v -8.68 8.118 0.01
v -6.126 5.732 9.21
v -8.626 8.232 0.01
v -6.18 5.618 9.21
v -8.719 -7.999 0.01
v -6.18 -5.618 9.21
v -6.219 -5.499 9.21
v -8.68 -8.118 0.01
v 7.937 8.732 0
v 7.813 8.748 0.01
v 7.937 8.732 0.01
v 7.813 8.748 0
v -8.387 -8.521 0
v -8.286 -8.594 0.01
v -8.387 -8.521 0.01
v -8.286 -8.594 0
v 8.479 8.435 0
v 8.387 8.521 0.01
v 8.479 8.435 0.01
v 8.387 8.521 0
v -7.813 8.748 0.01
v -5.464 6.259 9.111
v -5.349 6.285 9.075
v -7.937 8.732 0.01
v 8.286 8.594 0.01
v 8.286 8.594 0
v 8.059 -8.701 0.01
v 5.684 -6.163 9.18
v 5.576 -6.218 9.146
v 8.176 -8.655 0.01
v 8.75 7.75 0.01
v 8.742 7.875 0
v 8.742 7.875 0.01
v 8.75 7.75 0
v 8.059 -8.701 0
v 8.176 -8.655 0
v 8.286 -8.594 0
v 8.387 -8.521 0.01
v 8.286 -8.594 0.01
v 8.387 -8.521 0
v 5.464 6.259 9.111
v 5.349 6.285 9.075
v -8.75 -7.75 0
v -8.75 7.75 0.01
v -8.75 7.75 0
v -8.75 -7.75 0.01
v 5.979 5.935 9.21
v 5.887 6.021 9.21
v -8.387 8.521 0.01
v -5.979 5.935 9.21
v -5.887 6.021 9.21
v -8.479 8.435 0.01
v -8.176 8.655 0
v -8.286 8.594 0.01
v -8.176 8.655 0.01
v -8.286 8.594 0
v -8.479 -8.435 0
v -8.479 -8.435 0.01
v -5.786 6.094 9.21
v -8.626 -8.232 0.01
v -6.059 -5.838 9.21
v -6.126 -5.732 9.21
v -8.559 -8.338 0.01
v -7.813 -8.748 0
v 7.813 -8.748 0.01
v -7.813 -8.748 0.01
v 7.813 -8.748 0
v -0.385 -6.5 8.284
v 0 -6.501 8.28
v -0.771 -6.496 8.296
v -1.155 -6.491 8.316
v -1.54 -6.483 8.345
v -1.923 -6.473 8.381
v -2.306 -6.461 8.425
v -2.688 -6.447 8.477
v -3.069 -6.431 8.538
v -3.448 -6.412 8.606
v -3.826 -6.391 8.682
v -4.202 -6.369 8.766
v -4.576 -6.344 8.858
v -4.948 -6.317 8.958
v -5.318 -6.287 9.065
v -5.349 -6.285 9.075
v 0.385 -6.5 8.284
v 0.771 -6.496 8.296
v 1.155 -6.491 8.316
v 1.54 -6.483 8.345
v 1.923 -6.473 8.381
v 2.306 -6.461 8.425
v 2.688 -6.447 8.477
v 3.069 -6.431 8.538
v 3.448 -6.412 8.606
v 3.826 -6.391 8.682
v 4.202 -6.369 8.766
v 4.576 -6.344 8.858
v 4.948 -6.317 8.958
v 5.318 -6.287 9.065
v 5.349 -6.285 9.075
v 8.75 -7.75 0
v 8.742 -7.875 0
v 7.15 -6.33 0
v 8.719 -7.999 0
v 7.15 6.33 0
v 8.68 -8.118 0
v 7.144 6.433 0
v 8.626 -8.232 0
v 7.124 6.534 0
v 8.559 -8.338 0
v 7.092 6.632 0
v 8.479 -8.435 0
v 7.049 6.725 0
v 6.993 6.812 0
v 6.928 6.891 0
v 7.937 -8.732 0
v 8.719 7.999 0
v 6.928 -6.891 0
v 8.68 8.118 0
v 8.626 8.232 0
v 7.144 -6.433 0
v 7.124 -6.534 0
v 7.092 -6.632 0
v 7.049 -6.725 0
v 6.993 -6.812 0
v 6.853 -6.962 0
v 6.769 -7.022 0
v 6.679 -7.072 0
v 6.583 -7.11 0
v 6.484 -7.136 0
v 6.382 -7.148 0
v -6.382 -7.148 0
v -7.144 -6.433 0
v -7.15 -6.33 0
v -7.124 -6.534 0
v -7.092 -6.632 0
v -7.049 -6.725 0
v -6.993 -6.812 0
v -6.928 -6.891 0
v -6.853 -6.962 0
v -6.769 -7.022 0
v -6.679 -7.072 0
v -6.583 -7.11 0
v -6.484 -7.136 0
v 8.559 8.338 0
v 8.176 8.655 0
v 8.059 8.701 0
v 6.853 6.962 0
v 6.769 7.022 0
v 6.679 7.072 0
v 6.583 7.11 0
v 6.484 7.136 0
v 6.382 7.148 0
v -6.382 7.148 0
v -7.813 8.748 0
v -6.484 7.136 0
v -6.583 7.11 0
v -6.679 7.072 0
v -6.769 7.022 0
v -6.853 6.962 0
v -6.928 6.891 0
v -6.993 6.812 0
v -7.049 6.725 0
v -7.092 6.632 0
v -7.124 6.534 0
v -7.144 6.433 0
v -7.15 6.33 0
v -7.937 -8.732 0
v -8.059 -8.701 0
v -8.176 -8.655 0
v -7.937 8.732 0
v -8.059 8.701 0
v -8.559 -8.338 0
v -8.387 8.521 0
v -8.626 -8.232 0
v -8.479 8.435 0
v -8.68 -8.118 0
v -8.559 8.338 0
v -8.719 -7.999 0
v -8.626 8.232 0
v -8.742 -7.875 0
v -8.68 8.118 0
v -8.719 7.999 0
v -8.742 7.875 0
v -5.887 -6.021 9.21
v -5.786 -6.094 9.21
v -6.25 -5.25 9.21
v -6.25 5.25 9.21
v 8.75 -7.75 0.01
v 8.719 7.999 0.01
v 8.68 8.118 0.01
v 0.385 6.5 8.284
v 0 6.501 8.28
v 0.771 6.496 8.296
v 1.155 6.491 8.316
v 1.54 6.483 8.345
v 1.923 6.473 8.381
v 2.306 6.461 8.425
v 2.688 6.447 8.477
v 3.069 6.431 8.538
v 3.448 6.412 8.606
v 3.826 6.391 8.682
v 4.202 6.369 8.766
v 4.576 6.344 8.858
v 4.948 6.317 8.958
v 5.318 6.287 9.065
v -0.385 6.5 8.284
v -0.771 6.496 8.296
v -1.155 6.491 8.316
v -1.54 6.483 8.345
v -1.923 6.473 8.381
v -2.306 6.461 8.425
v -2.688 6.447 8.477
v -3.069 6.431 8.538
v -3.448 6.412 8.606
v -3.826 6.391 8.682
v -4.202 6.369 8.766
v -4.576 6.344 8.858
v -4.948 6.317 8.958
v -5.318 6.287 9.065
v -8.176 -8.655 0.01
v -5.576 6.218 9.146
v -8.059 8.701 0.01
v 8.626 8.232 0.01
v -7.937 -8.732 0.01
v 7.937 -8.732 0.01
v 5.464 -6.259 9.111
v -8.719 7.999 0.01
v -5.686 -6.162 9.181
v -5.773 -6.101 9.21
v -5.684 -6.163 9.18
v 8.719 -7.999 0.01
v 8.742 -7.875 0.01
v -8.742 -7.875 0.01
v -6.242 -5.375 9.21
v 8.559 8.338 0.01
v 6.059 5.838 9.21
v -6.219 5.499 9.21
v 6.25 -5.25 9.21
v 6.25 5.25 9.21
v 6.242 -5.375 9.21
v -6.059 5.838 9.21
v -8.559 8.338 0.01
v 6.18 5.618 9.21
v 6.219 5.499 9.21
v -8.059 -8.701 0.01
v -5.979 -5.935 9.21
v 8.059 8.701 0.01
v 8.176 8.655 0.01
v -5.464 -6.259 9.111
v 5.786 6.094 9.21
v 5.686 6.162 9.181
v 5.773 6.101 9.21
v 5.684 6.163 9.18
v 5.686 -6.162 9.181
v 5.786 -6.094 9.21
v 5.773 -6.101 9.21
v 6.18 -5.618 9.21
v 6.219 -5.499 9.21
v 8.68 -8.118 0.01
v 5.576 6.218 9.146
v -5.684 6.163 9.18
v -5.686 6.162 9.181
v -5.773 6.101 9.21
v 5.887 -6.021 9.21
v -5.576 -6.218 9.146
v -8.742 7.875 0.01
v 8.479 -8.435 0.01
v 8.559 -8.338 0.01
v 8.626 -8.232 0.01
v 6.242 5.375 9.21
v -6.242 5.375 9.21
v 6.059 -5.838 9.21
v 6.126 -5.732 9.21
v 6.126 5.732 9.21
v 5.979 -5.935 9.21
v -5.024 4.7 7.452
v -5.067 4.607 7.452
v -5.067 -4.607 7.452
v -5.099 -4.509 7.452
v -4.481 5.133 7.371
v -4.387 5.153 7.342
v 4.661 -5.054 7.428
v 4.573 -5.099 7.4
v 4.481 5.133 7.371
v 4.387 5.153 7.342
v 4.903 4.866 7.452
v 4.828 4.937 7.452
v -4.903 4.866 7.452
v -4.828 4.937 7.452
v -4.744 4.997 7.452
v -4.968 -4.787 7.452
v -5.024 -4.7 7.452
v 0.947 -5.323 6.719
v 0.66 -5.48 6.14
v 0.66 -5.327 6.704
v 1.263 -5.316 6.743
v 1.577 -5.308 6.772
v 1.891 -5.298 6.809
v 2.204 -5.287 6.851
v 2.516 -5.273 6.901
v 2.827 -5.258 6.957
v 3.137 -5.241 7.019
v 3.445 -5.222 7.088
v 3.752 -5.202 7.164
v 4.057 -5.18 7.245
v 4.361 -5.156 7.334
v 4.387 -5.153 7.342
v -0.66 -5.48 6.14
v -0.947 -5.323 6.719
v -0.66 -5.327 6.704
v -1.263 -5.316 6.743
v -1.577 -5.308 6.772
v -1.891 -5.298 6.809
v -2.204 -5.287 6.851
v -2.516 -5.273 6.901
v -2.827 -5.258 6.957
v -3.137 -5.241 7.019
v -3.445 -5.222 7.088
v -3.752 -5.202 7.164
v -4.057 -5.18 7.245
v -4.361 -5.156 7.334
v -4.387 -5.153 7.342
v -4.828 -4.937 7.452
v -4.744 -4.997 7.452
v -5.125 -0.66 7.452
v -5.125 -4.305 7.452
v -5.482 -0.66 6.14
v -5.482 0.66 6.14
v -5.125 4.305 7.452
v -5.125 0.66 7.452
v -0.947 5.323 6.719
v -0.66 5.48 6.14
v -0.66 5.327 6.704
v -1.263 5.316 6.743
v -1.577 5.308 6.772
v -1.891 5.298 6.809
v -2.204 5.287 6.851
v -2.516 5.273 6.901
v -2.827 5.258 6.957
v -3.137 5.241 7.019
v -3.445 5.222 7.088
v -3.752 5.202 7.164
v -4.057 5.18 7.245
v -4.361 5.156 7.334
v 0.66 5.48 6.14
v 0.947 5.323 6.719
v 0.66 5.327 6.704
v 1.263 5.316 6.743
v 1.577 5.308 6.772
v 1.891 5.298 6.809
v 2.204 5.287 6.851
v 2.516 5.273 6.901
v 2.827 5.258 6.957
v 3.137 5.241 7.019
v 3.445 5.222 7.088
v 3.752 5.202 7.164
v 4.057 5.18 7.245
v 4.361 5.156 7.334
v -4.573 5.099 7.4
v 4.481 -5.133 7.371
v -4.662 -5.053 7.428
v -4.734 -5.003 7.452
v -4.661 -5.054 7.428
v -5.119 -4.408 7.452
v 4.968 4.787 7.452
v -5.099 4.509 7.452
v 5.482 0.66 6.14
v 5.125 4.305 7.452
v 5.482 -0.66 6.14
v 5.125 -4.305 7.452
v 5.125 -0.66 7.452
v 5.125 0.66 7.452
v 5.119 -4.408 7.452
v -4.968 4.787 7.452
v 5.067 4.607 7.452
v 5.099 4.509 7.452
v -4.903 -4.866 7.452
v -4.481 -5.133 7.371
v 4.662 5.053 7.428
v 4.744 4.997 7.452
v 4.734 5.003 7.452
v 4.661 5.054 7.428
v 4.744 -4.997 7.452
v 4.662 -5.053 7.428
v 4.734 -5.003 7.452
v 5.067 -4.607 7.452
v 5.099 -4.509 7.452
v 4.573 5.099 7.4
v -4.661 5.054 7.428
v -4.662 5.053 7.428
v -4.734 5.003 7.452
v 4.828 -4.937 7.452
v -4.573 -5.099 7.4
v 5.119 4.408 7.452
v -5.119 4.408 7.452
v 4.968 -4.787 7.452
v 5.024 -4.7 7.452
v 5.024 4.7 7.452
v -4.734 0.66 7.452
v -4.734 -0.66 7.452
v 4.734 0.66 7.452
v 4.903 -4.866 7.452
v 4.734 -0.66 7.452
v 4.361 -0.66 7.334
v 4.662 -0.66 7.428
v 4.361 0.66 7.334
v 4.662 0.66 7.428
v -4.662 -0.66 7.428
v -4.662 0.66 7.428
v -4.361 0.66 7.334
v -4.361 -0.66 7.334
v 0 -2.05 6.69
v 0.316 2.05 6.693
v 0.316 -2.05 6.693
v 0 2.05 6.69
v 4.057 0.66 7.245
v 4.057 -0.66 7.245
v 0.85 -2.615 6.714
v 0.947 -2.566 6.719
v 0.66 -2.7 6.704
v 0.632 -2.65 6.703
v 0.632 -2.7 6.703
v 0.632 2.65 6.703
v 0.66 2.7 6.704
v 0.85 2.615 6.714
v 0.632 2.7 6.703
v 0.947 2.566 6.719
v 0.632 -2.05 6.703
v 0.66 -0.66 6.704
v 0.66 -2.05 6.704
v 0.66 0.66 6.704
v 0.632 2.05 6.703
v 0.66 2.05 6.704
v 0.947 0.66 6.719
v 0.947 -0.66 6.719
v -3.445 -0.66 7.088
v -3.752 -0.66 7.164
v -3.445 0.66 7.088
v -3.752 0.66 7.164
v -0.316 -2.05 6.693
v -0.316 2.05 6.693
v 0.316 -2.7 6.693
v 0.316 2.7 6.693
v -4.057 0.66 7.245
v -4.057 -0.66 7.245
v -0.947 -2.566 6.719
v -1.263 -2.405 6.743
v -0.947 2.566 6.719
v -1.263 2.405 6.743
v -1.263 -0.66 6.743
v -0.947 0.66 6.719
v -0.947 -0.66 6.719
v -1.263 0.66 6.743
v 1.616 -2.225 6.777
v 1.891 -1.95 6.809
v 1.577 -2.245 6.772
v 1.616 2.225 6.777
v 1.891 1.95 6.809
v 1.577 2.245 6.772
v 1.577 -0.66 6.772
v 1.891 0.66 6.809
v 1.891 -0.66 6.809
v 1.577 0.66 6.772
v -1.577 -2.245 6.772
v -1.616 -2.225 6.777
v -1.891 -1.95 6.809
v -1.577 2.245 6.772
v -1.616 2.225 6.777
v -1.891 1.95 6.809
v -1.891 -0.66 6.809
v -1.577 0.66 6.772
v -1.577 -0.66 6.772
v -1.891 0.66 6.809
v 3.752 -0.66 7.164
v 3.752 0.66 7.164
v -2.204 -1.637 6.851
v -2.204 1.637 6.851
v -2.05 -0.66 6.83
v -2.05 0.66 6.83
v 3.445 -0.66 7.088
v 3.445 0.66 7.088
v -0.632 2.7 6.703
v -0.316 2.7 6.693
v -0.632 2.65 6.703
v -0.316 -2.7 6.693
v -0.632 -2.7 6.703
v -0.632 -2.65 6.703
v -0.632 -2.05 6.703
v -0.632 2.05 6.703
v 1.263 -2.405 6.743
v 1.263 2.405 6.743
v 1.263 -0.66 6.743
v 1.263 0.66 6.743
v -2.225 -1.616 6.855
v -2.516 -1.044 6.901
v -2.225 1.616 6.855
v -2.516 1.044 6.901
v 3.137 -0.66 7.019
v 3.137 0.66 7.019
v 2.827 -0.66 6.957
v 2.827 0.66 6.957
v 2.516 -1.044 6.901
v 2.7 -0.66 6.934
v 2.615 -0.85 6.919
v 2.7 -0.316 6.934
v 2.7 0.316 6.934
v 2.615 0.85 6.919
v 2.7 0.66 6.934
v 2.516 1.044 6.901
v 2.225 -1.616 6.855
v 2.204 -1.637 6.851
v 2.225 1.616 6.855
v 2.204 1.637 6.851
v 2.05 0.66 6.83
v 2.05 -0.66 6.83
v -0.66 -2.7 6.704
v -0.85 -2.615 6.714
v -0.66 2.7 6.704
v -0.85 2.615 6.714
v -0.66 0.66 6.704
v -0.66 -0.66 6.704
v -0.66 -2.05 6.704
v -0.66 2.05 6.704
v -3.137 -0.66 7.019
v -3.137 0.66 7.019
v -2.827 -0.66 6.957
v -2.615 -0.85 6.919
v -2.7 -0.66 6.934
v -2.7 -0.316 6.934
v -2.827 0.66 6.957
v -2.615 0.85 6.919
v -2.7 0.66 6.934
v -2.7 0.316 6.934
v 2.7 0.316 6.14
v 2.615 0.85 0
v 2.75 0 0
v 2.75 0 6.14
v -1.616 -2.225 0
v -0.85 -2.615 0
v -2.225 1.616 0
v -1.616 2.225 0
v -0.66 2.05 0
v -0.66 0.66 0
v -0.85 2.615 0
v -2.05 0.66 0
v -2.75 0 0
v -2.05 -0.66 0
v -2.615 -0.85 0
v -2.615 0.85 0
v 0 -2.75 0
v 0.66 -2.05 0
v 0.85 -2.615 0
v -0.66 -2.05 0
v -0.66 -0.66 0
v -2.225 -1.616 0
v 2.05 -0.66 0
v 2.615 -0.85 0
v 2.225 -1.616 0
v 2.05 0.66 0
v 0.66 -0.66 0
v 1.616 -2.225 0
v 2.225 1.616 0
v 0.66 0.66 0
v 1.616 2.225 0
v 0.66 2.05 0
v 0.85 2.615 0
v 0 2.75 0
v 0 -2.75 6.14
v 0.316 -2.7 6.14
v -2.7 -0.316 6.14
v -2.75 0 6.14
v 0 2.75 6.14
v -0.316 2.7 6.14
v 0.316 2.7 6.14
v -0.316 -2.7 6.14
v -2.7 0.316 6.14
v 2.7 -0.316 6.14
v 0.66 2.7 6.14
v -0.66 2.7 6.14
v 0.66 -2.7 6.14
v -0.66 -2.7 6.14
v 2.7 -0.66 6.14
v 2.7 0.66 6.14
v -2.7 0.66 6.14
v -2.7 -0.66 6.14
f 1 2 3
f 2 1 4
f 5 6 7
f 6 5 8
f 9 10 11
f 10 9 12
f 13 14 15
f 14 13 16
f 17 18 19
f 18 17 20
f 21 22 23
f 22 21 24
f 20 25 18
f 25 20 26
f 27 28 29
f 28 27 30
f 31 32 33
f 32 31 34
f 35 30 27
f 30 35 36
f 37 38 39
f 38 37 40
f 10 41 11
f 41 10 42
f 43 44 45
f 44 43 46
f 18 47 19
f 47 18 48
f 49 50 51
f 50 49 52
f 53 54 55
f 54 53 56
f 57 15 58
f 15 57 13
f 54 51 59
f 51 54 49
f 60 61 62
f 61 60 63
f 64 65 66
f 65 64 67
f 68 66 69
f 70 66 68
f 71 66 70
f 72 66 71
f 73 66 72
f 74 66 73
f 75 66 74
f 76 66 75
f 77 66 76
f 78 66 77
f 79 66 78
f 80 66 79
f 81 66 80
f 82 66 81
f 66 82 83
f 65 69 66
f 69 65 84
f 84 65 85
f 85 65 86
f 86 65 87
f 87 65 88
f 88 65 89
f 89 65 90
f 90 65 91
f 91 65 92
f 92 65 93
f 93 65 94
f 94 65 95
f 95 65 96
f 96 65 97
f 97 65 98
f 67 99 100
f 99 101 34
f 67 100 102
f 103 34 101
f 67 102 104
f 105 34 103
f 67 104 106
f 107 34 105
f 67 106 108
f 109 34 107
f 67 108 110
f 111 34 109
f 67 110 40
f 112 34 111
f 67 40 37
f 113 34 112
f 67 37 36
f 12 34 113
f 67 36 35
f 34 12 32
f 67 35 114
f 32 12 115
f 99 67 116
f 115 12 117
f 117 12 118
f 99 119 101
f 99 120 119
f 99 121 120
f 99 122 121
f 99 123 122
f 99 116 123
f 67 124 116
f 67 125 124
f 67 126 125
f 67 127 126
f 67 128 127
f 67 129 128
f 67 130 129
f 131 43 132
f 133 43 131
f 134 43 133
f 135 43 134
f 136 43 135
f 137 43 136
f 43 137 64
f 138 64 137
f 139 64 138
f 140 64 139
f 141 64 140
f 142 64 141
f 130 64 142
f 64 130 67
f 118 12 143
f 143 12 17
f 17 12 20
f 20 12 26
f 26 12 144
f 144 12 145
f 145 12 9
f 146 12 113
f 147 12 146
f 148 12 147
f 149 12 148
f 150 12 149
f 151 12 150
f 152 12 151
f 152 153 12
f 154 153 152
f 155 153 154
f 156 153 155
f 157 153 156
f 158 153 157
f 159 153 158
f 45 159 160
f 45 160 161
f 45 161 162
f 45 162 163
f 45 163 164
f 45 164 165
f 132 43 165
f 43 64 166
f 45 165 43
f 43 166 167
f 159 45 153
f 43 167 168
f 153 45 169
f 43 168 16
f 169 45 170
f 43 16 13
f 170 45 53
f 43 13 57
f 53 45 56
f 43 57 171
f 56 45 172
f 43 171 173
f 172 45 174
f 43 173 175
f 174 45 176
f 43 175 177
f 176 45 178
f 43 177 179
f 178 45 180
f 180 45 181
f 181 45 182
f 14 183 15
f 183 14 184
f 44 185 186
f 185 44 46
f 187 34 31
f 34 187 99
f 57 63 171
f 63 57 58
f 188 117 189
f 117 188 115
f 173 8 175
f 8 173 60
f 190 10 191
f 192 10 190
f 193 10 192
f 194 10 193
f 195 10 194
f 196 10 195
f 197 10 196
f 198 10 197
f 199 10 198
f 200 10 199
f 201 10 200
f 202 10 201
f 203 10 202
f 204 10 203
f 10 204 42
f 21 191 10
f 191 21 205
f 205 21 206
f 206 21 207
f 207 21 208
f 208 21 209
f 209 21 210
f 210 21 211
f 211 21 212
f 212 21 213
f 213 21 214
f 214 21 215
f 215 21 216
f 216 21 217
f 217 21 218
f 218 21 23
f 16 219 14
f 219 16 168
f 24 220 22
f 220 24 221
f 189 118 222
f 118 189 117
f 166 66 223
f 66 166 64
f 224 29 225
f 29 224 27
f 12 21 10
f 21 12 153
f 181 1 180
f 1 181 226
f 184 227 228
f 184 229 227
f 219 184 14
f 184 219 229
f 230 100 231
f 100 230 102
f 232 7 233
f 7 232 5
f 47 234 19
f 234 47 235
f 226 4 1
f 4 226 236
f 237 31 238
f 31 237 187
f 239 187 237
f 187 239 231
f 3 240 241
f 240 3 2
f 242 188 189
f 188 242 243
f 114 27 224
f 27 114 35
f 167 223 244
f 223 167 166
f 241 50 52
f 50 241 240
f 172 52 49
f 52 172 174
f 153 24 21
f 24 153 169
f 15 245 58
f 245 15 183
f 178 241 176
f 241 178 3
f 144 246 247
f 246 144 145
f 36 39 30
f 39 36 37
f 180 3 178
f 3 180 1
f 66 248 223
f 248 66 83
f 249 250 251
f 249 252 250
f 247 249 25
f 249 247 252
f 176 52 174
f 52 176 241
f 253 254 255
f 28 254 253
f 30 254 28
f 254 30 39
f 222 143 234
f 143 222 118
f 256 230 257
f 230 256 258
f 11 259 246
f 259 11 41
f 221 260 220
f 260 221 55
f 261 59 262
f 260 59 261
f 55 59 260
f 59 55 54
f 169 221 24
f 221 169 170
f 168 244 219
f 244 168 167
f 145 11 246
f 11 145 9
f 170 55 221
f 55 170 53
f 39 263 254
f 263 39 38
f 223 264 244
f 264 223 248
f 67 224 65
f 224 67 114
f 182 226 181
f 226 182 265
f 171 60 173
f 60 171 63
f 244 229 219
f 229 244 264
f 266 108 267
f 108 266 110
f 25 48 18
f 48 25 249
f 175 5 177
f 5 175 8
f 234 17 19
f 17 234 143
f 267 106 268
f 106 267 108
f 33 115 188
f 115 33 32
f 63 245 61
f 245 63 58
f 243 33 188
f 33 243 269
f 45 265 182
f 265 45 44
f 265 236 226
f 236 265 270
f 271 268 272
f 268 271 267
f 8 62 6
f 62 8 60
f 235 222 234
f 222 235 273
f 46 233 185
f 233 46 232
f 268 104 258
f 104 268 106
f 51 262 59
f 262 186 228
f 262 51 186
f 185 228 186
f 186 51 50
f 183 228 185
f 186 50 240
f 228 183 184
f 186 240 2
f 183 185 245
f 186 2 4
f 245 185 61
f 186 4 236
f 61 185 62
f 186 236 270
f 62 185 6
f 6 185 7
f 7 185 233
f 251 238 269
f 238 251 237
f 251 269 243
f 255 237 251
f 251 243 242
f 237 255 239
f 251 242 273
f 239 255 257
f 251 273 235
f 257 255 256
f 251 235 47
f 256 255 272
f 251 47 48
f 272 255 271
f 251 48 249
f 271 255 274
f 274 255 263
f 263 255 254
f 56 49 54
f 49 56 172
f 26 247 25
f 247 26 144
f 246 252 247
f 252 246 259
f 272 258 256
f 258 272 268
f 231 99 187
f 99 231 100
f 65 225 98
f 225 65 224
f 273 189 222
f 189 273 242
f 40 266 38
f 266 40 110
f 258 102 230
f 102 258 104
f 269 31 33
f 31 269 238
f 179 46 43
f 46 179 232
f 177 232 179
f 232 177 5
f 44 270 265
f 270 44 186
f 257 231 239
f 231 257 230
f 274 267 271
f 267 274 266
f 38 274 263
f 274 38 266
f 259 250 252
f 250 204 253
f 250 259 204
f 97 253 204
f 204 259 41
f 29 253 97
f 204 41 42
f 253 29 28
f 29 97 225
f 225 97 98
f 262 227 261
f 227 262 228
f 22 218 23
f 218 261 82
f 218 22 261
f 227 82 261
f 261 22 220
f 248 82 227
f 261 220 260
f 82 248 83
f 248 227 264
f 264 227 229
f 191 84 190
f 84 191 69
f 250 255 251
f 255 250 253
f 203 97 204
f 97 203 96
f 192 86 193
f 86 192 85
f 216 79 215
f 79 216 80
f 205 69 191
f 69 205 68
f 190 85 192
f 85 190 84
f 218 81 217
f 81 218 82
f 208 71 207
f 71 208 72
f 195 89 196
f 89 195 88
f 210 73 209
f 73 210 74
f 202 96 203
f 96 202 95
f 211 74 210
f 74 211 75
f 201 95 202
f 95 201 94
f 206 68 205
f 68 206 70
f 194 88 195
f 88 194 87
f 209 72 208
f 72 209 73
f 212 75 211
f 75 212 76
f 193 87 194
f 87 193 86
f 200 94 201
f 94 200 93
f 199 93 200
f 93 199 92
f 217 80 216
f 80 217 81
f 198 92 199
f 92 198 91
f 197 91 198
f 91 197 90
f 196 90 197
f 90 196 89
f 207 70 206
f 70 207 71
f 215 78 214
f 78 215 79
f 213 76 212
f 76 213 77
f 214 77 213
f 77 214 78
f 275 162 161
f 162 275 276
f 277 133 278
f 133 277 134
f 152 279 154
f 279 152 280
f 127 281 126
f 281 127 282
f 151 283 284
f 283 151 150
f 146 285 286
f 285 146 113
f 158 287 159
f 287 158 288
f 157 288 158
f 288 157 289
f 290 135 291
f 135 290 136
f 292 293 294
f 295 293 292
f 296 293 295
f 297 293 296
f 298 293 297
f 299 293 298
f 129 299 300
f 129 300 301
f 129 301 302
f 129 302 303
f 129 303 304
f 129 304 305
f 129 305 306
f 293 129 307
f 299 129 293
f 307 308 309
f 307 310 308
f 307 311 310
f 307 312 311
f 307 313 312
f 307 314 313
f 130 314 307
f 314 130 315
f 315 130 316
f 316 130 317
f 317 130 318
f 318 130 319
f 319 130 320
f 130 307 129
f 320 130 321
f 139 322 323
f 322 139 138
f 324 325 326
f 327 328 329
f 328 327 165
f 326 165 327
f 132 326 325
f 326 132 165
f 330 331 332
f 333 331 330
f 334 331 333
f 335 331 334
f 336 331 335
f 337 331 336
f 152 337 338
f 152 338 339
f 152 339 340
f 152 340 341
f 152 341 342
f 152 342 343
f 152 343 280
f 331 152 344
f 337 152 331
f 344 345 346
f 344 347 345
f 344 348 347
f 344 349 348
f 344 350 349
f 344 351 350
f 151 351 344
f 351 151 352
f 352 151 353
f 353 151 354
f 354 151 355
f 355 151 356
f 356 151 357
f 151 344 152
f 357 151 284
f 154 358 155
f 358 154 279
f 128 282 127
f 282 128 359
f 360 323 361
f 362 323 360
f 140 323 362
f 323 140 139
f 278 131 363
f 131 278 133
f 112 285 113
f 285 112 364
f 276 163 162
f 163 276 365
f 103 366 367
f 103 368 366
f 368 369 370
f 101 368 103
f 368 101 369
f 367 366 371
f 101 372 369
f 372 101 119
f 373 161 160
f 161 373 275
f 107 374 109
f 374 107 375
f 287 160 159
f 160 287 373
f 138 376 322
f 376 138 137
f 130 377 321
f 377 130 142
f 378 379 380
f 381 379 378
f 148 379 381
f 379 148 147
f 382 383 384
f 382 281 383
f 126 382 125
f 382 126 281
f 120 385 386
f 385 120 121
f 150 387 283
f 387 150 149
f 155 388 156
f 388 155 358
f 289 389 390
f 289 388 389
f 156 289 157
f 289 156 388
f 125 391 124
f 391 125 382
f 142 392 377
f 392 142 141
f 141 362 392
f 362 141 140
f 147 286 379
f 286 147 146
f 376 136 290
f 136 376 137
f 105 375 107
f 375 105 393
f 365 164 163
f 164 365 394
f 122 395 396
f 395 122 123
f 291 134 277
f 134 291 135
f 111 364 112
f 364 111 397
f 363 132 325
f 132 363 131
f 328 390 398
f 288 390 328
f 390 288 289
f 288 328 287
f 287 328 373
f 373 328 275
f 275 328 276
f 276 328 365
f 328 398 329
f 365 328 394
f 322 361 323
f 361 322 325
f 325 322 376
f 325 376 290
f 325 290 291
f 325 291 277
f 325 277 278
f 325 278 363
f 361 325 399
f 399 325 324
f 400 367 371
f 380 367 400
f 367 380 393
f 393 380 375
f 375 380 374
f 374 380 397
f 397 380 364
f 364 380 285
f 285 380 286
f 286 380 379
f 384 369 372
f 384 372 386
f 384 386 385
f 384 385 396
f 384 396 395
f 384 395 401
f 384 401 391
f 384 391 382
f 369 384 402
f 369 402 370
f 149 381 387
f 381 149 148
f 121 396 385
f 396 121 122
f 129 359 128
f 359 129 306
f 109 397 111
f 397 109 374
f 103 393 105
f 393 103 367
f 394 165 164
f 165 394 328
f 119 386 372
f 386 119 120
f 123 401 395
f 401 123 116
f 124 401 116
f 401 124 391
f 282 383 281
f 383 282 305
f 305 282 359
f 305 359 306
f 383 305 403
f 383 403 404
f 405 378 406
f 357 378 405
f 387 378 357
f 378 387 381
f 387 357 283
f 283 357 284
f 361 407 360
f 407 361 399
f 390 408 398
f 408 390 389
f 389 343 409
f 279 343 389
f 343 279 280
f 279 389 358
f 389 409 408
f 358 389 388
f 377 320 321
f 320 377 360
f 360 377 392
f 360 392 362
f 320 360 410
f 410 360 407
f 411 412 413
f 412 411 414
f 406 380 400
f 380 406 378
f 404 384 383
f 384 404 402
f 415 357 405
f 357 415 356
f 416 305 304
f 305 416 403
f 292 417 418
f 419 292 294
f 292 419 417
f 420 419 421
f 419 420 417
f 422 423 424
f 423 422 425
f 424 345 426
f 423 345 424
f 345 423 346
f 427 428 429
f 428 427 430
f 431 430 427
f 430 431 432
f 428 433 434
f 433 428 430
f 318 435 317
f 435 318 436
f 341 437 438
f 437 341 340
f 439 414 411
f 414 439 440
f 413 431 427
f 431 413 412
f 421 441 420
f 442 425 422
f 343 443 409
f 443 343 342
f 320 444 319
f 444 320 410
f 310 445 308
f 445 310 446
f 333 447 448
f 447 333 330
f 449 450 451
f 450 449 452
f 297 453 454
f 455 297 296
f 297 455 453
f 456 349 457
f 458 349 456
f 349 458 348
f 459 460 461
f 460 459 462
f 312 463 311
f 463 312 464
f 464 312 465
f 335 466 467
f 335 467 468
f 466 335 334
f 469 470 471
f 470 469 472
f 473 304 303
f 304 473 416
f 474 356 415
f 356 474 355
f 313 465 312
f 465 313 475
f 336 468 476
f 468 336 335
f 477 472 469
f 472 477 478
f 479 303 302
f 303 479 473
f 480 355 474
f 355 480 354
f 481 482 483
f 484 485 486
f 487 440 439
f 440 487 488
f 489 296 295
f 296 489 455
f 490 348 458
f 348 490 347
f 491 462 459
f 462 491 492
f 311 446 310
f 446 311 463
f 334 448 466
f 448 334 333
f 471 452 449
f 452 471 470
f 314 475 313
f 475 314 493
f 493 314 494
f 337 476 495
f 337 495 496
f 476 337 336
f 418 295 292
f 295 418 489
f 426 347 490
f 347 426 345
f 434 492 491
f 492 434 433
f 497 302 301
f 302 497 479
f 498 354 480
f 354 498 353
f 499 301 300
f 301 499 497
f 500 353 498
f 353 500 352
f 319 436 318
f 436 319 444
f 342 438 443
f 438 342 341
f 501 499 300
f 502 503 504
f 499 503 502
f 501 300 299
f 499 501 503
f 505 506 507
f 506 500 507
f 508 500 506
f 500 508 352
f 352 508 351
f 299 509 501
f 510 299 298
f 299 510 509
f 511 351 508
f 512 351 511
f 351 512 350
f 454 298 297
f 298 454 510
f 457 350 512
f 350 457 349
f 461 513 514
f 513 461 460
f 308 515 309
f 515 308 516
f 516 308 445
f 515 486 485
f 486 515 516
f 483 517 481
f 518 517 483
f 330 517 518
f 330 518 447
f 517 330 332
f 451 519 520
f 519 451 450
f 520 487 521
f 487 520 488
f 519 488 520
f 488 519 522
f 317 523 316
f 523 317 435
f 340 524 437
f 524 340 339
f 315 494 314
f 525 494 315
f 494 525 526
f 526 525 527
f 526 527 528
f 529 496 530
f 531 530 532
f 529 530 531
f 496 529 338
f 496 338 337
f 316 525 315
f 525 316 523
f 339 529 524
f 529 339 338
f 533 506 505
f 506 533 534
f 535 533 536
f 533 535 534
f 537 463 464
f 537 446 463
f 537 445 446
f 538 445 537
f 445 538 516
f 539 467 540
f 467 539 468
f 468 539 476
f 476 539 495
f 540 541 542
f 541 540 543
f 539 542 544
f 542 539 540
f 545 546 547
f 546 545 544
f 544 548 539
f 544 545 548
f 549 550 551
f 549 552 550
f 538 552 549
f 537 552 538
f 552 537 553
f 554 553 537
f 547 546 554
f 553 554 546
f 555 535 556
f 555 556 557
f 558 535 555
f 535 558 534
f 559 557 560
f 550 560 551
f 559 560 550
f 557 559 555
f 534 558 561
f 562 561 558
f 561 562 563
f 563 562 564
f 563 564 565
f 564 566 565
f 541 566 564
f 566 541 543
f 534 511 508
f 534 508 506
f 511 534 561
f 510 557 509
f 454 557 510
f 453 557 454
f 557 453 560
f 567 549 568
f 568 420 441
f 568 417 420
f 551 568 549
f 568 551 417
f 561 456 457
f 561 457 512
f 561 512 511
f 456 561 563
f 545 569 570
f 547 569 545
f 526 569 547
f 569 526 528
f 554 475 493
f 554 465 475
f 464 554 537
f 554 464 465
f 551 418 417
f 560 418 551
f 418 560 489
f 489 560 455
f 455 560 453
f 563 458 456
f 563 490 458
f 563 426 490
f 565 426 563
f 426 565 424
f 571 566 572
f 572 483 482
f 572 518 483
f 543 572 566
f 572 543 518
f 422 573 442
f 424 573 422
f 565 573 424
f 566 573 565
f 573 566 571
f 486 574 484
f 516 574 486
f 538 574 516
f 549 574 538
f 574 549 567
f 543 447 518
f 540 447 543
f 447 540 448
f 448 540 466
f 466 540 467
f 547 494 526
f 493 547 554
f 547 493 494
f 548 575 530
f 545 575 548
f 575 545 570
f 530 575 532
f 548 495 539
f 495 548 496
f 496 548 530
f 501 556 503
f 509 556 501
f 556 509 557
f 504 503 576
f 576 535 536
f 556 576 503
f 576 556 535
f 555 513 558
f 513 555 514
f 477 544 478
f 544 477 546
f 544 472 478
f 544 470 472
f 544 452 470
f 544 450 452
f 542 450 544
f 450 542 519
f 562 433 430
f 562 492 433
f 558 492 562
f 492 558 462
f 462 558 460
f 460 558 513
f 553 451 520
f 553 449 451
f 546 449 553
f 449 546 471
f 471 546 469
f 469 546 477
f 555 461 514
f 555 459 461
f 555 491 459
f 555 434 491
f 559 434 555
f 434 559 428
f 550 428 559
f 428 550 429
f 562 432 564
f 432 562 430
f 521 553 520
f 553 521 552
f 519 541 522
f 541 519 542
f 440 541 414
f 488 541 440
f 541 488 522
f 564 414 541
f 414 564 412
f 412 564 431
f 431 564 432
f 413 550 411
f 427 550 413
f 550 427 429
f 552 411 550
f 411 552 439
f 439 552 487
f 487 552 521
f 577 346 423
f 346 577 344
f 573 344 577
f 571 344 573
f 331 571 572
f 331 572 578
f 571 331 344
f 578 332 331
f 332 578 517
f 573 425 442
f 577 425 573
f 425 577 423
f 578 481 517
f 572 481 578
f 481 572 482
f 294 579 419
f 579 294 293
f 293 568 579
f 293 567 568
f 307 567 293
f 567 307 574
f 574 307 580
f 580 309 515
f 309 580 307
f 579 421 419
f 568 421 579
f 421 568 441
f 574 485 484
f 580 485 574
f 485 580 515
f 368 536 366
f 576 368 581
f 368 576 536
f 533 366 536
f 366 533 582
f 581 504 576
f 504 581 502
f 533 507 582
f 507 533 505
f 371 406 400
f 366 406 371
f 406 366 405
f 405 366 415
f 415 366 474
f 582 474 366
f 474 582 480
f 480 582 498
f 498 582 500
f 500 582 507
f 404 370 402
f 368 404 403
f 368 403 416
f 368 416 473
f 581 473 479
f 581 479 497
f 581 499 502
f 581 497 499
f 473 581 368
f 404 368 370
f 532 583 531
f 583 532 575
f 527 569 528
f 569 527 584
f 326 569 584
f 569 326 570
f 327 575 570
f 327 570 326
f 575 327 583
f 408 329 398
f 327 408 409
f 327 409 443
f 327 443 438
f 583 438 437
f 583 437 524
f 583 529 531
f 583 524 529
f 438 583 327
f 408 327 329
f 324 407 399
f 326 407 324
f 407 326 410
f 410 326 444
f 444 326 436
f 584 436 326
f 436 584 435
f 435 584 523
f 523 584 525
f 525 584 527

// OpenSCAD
height = 9.2;
top_side = 12.5;
bottom_side = 17.5;
corner_diameter = 2;
stem_diameter=5.5;
inner_hollow_scale = 0.82;

// I'm printing in my local library and don't have access to printer settings,
// So I have modified slots a little bit to make them tighter.
// Original dimensions were [4.2,1.5,40]
slot_length = 4.1;
slot_width = 1.32;
slots = [[slot_length,slot_width, inner_hollow_scale*height], [slot_width,slot_length, inner_hollow_scale*height]];

check_cubes(all=false, top=false, bottom=false, wall=false);

// sharp, postsoft, presoft
style = "presoft";


corner_offset = corner_diameter * sqrt(2);

cone_top_diameter = circumscribed_circle(top_side) - corner_offset;
cone_bottom_diameter = circumscribed_circle(bottom_side) - corner_offset;

// cap
difference() {
    keycap();
    translate([0, 0, -0.1]) scale(inner_hollow_scale) keycap();
}

// stem
difference() {
    cylinder(inner_hollow_scale*height, d=stem_diameter, $fn=20);
    translate([0,0, inner_hollow_scale*height/2-0.1]) cube(slots[0], center=true);
    translate([0,0, inner_hollow_scale*height/2-0.1]) cube(slots[1], center=true);
}
// struts
translate([0, 4.6, 6.8]) cube([slot_width, 3.8, slot_width], center=true);
translate([0, -4.6, 6.8]) cube([slot_width, 3.8, slot_width], center=true);
translate([4.6, 0, 6.8]) cube([3.8, slot_width, slot_width], center=true);
translate([-4.6, 0, 6.8]) cube([3.8, slot_width, slot_width], center=true);



module keycap() {
    // sharp
    if (style=="sharp") {
        difference() {
                rotate([0, 0, 45]) cylinder(height,d2=circumscribed_circle(top_side), d1=circumscribed_circle(bottom_side), $fn=4);
                translate([0, 0, 2.9*height]) rotate([90, 90, 0]) cylinder(bottom_side,r=2*height, $fn=300, center=true);
        }
    }

    // post soft
    if (style=="postsoft") {
        minkowski() {
            difference() {
                compensation = sqrt(2) * corner_diameter;
                translate([0, 0, corner_diameter/2]) rotate([0, 0, 45]) cylinder(
                    height - corner_diameter,
                    d2=circumscribed_circle(top_side) - compensation,
                    d1=circumscribed_circle(bottom_side) - compensation,
                    $fn=4
                );
                translate([0, 0, 2.805*height]) rotate([90, 90, 0]) cylinder(bottom_side,r=2*height, $fn=300, center=true);
            }    
            sphere(d=corner_diameter, $fn=50);
        }
    }

    // pre soft
    if (style=="presoft") {
        difference() {
            minkowski() {
                rotate([0, 0, 45]) cylinder(height,d1=cone_bottom_diameter,d2=cone_top_diameter,$fn=4);
                cylinder(0.01,d=corner_diameter,$fn=50);                
            };
            translate([0, 0, 2.9*height]) rotate([90, 90, 0]) cylinder(bottom_side,r=2*height, $fn=300, center=true);            
            // Quick and dirty sharp edge removal
            // translate([-0.6*top_side, -top_side, 0.825*height]) rotate([7, 0, 0]) cube(15);
        } 
    }
}


module check_cubes(all=false, bottom=false, top=false, wall=false) {
    // Dimensions check cubes
    if (all || bottom) {
        color("Red") { translate([-bottom_side/2, 0, 0]) cube([bottom_side, bottom_side, height]); }
    }
    if (all || top) {
        color("Green") { translate([-top_side/2, -top_side/2, 0]) cube([top_side, top_side, height]); }
    }
    if (all || wall) {
        color("Orange") { translate([bottom_side/2, -bottom_side/2, 0]) cube([1.7, 1.7, 1.7]); }
    }
}

function circumscribed_circle(side) = side * sqrt(2);
